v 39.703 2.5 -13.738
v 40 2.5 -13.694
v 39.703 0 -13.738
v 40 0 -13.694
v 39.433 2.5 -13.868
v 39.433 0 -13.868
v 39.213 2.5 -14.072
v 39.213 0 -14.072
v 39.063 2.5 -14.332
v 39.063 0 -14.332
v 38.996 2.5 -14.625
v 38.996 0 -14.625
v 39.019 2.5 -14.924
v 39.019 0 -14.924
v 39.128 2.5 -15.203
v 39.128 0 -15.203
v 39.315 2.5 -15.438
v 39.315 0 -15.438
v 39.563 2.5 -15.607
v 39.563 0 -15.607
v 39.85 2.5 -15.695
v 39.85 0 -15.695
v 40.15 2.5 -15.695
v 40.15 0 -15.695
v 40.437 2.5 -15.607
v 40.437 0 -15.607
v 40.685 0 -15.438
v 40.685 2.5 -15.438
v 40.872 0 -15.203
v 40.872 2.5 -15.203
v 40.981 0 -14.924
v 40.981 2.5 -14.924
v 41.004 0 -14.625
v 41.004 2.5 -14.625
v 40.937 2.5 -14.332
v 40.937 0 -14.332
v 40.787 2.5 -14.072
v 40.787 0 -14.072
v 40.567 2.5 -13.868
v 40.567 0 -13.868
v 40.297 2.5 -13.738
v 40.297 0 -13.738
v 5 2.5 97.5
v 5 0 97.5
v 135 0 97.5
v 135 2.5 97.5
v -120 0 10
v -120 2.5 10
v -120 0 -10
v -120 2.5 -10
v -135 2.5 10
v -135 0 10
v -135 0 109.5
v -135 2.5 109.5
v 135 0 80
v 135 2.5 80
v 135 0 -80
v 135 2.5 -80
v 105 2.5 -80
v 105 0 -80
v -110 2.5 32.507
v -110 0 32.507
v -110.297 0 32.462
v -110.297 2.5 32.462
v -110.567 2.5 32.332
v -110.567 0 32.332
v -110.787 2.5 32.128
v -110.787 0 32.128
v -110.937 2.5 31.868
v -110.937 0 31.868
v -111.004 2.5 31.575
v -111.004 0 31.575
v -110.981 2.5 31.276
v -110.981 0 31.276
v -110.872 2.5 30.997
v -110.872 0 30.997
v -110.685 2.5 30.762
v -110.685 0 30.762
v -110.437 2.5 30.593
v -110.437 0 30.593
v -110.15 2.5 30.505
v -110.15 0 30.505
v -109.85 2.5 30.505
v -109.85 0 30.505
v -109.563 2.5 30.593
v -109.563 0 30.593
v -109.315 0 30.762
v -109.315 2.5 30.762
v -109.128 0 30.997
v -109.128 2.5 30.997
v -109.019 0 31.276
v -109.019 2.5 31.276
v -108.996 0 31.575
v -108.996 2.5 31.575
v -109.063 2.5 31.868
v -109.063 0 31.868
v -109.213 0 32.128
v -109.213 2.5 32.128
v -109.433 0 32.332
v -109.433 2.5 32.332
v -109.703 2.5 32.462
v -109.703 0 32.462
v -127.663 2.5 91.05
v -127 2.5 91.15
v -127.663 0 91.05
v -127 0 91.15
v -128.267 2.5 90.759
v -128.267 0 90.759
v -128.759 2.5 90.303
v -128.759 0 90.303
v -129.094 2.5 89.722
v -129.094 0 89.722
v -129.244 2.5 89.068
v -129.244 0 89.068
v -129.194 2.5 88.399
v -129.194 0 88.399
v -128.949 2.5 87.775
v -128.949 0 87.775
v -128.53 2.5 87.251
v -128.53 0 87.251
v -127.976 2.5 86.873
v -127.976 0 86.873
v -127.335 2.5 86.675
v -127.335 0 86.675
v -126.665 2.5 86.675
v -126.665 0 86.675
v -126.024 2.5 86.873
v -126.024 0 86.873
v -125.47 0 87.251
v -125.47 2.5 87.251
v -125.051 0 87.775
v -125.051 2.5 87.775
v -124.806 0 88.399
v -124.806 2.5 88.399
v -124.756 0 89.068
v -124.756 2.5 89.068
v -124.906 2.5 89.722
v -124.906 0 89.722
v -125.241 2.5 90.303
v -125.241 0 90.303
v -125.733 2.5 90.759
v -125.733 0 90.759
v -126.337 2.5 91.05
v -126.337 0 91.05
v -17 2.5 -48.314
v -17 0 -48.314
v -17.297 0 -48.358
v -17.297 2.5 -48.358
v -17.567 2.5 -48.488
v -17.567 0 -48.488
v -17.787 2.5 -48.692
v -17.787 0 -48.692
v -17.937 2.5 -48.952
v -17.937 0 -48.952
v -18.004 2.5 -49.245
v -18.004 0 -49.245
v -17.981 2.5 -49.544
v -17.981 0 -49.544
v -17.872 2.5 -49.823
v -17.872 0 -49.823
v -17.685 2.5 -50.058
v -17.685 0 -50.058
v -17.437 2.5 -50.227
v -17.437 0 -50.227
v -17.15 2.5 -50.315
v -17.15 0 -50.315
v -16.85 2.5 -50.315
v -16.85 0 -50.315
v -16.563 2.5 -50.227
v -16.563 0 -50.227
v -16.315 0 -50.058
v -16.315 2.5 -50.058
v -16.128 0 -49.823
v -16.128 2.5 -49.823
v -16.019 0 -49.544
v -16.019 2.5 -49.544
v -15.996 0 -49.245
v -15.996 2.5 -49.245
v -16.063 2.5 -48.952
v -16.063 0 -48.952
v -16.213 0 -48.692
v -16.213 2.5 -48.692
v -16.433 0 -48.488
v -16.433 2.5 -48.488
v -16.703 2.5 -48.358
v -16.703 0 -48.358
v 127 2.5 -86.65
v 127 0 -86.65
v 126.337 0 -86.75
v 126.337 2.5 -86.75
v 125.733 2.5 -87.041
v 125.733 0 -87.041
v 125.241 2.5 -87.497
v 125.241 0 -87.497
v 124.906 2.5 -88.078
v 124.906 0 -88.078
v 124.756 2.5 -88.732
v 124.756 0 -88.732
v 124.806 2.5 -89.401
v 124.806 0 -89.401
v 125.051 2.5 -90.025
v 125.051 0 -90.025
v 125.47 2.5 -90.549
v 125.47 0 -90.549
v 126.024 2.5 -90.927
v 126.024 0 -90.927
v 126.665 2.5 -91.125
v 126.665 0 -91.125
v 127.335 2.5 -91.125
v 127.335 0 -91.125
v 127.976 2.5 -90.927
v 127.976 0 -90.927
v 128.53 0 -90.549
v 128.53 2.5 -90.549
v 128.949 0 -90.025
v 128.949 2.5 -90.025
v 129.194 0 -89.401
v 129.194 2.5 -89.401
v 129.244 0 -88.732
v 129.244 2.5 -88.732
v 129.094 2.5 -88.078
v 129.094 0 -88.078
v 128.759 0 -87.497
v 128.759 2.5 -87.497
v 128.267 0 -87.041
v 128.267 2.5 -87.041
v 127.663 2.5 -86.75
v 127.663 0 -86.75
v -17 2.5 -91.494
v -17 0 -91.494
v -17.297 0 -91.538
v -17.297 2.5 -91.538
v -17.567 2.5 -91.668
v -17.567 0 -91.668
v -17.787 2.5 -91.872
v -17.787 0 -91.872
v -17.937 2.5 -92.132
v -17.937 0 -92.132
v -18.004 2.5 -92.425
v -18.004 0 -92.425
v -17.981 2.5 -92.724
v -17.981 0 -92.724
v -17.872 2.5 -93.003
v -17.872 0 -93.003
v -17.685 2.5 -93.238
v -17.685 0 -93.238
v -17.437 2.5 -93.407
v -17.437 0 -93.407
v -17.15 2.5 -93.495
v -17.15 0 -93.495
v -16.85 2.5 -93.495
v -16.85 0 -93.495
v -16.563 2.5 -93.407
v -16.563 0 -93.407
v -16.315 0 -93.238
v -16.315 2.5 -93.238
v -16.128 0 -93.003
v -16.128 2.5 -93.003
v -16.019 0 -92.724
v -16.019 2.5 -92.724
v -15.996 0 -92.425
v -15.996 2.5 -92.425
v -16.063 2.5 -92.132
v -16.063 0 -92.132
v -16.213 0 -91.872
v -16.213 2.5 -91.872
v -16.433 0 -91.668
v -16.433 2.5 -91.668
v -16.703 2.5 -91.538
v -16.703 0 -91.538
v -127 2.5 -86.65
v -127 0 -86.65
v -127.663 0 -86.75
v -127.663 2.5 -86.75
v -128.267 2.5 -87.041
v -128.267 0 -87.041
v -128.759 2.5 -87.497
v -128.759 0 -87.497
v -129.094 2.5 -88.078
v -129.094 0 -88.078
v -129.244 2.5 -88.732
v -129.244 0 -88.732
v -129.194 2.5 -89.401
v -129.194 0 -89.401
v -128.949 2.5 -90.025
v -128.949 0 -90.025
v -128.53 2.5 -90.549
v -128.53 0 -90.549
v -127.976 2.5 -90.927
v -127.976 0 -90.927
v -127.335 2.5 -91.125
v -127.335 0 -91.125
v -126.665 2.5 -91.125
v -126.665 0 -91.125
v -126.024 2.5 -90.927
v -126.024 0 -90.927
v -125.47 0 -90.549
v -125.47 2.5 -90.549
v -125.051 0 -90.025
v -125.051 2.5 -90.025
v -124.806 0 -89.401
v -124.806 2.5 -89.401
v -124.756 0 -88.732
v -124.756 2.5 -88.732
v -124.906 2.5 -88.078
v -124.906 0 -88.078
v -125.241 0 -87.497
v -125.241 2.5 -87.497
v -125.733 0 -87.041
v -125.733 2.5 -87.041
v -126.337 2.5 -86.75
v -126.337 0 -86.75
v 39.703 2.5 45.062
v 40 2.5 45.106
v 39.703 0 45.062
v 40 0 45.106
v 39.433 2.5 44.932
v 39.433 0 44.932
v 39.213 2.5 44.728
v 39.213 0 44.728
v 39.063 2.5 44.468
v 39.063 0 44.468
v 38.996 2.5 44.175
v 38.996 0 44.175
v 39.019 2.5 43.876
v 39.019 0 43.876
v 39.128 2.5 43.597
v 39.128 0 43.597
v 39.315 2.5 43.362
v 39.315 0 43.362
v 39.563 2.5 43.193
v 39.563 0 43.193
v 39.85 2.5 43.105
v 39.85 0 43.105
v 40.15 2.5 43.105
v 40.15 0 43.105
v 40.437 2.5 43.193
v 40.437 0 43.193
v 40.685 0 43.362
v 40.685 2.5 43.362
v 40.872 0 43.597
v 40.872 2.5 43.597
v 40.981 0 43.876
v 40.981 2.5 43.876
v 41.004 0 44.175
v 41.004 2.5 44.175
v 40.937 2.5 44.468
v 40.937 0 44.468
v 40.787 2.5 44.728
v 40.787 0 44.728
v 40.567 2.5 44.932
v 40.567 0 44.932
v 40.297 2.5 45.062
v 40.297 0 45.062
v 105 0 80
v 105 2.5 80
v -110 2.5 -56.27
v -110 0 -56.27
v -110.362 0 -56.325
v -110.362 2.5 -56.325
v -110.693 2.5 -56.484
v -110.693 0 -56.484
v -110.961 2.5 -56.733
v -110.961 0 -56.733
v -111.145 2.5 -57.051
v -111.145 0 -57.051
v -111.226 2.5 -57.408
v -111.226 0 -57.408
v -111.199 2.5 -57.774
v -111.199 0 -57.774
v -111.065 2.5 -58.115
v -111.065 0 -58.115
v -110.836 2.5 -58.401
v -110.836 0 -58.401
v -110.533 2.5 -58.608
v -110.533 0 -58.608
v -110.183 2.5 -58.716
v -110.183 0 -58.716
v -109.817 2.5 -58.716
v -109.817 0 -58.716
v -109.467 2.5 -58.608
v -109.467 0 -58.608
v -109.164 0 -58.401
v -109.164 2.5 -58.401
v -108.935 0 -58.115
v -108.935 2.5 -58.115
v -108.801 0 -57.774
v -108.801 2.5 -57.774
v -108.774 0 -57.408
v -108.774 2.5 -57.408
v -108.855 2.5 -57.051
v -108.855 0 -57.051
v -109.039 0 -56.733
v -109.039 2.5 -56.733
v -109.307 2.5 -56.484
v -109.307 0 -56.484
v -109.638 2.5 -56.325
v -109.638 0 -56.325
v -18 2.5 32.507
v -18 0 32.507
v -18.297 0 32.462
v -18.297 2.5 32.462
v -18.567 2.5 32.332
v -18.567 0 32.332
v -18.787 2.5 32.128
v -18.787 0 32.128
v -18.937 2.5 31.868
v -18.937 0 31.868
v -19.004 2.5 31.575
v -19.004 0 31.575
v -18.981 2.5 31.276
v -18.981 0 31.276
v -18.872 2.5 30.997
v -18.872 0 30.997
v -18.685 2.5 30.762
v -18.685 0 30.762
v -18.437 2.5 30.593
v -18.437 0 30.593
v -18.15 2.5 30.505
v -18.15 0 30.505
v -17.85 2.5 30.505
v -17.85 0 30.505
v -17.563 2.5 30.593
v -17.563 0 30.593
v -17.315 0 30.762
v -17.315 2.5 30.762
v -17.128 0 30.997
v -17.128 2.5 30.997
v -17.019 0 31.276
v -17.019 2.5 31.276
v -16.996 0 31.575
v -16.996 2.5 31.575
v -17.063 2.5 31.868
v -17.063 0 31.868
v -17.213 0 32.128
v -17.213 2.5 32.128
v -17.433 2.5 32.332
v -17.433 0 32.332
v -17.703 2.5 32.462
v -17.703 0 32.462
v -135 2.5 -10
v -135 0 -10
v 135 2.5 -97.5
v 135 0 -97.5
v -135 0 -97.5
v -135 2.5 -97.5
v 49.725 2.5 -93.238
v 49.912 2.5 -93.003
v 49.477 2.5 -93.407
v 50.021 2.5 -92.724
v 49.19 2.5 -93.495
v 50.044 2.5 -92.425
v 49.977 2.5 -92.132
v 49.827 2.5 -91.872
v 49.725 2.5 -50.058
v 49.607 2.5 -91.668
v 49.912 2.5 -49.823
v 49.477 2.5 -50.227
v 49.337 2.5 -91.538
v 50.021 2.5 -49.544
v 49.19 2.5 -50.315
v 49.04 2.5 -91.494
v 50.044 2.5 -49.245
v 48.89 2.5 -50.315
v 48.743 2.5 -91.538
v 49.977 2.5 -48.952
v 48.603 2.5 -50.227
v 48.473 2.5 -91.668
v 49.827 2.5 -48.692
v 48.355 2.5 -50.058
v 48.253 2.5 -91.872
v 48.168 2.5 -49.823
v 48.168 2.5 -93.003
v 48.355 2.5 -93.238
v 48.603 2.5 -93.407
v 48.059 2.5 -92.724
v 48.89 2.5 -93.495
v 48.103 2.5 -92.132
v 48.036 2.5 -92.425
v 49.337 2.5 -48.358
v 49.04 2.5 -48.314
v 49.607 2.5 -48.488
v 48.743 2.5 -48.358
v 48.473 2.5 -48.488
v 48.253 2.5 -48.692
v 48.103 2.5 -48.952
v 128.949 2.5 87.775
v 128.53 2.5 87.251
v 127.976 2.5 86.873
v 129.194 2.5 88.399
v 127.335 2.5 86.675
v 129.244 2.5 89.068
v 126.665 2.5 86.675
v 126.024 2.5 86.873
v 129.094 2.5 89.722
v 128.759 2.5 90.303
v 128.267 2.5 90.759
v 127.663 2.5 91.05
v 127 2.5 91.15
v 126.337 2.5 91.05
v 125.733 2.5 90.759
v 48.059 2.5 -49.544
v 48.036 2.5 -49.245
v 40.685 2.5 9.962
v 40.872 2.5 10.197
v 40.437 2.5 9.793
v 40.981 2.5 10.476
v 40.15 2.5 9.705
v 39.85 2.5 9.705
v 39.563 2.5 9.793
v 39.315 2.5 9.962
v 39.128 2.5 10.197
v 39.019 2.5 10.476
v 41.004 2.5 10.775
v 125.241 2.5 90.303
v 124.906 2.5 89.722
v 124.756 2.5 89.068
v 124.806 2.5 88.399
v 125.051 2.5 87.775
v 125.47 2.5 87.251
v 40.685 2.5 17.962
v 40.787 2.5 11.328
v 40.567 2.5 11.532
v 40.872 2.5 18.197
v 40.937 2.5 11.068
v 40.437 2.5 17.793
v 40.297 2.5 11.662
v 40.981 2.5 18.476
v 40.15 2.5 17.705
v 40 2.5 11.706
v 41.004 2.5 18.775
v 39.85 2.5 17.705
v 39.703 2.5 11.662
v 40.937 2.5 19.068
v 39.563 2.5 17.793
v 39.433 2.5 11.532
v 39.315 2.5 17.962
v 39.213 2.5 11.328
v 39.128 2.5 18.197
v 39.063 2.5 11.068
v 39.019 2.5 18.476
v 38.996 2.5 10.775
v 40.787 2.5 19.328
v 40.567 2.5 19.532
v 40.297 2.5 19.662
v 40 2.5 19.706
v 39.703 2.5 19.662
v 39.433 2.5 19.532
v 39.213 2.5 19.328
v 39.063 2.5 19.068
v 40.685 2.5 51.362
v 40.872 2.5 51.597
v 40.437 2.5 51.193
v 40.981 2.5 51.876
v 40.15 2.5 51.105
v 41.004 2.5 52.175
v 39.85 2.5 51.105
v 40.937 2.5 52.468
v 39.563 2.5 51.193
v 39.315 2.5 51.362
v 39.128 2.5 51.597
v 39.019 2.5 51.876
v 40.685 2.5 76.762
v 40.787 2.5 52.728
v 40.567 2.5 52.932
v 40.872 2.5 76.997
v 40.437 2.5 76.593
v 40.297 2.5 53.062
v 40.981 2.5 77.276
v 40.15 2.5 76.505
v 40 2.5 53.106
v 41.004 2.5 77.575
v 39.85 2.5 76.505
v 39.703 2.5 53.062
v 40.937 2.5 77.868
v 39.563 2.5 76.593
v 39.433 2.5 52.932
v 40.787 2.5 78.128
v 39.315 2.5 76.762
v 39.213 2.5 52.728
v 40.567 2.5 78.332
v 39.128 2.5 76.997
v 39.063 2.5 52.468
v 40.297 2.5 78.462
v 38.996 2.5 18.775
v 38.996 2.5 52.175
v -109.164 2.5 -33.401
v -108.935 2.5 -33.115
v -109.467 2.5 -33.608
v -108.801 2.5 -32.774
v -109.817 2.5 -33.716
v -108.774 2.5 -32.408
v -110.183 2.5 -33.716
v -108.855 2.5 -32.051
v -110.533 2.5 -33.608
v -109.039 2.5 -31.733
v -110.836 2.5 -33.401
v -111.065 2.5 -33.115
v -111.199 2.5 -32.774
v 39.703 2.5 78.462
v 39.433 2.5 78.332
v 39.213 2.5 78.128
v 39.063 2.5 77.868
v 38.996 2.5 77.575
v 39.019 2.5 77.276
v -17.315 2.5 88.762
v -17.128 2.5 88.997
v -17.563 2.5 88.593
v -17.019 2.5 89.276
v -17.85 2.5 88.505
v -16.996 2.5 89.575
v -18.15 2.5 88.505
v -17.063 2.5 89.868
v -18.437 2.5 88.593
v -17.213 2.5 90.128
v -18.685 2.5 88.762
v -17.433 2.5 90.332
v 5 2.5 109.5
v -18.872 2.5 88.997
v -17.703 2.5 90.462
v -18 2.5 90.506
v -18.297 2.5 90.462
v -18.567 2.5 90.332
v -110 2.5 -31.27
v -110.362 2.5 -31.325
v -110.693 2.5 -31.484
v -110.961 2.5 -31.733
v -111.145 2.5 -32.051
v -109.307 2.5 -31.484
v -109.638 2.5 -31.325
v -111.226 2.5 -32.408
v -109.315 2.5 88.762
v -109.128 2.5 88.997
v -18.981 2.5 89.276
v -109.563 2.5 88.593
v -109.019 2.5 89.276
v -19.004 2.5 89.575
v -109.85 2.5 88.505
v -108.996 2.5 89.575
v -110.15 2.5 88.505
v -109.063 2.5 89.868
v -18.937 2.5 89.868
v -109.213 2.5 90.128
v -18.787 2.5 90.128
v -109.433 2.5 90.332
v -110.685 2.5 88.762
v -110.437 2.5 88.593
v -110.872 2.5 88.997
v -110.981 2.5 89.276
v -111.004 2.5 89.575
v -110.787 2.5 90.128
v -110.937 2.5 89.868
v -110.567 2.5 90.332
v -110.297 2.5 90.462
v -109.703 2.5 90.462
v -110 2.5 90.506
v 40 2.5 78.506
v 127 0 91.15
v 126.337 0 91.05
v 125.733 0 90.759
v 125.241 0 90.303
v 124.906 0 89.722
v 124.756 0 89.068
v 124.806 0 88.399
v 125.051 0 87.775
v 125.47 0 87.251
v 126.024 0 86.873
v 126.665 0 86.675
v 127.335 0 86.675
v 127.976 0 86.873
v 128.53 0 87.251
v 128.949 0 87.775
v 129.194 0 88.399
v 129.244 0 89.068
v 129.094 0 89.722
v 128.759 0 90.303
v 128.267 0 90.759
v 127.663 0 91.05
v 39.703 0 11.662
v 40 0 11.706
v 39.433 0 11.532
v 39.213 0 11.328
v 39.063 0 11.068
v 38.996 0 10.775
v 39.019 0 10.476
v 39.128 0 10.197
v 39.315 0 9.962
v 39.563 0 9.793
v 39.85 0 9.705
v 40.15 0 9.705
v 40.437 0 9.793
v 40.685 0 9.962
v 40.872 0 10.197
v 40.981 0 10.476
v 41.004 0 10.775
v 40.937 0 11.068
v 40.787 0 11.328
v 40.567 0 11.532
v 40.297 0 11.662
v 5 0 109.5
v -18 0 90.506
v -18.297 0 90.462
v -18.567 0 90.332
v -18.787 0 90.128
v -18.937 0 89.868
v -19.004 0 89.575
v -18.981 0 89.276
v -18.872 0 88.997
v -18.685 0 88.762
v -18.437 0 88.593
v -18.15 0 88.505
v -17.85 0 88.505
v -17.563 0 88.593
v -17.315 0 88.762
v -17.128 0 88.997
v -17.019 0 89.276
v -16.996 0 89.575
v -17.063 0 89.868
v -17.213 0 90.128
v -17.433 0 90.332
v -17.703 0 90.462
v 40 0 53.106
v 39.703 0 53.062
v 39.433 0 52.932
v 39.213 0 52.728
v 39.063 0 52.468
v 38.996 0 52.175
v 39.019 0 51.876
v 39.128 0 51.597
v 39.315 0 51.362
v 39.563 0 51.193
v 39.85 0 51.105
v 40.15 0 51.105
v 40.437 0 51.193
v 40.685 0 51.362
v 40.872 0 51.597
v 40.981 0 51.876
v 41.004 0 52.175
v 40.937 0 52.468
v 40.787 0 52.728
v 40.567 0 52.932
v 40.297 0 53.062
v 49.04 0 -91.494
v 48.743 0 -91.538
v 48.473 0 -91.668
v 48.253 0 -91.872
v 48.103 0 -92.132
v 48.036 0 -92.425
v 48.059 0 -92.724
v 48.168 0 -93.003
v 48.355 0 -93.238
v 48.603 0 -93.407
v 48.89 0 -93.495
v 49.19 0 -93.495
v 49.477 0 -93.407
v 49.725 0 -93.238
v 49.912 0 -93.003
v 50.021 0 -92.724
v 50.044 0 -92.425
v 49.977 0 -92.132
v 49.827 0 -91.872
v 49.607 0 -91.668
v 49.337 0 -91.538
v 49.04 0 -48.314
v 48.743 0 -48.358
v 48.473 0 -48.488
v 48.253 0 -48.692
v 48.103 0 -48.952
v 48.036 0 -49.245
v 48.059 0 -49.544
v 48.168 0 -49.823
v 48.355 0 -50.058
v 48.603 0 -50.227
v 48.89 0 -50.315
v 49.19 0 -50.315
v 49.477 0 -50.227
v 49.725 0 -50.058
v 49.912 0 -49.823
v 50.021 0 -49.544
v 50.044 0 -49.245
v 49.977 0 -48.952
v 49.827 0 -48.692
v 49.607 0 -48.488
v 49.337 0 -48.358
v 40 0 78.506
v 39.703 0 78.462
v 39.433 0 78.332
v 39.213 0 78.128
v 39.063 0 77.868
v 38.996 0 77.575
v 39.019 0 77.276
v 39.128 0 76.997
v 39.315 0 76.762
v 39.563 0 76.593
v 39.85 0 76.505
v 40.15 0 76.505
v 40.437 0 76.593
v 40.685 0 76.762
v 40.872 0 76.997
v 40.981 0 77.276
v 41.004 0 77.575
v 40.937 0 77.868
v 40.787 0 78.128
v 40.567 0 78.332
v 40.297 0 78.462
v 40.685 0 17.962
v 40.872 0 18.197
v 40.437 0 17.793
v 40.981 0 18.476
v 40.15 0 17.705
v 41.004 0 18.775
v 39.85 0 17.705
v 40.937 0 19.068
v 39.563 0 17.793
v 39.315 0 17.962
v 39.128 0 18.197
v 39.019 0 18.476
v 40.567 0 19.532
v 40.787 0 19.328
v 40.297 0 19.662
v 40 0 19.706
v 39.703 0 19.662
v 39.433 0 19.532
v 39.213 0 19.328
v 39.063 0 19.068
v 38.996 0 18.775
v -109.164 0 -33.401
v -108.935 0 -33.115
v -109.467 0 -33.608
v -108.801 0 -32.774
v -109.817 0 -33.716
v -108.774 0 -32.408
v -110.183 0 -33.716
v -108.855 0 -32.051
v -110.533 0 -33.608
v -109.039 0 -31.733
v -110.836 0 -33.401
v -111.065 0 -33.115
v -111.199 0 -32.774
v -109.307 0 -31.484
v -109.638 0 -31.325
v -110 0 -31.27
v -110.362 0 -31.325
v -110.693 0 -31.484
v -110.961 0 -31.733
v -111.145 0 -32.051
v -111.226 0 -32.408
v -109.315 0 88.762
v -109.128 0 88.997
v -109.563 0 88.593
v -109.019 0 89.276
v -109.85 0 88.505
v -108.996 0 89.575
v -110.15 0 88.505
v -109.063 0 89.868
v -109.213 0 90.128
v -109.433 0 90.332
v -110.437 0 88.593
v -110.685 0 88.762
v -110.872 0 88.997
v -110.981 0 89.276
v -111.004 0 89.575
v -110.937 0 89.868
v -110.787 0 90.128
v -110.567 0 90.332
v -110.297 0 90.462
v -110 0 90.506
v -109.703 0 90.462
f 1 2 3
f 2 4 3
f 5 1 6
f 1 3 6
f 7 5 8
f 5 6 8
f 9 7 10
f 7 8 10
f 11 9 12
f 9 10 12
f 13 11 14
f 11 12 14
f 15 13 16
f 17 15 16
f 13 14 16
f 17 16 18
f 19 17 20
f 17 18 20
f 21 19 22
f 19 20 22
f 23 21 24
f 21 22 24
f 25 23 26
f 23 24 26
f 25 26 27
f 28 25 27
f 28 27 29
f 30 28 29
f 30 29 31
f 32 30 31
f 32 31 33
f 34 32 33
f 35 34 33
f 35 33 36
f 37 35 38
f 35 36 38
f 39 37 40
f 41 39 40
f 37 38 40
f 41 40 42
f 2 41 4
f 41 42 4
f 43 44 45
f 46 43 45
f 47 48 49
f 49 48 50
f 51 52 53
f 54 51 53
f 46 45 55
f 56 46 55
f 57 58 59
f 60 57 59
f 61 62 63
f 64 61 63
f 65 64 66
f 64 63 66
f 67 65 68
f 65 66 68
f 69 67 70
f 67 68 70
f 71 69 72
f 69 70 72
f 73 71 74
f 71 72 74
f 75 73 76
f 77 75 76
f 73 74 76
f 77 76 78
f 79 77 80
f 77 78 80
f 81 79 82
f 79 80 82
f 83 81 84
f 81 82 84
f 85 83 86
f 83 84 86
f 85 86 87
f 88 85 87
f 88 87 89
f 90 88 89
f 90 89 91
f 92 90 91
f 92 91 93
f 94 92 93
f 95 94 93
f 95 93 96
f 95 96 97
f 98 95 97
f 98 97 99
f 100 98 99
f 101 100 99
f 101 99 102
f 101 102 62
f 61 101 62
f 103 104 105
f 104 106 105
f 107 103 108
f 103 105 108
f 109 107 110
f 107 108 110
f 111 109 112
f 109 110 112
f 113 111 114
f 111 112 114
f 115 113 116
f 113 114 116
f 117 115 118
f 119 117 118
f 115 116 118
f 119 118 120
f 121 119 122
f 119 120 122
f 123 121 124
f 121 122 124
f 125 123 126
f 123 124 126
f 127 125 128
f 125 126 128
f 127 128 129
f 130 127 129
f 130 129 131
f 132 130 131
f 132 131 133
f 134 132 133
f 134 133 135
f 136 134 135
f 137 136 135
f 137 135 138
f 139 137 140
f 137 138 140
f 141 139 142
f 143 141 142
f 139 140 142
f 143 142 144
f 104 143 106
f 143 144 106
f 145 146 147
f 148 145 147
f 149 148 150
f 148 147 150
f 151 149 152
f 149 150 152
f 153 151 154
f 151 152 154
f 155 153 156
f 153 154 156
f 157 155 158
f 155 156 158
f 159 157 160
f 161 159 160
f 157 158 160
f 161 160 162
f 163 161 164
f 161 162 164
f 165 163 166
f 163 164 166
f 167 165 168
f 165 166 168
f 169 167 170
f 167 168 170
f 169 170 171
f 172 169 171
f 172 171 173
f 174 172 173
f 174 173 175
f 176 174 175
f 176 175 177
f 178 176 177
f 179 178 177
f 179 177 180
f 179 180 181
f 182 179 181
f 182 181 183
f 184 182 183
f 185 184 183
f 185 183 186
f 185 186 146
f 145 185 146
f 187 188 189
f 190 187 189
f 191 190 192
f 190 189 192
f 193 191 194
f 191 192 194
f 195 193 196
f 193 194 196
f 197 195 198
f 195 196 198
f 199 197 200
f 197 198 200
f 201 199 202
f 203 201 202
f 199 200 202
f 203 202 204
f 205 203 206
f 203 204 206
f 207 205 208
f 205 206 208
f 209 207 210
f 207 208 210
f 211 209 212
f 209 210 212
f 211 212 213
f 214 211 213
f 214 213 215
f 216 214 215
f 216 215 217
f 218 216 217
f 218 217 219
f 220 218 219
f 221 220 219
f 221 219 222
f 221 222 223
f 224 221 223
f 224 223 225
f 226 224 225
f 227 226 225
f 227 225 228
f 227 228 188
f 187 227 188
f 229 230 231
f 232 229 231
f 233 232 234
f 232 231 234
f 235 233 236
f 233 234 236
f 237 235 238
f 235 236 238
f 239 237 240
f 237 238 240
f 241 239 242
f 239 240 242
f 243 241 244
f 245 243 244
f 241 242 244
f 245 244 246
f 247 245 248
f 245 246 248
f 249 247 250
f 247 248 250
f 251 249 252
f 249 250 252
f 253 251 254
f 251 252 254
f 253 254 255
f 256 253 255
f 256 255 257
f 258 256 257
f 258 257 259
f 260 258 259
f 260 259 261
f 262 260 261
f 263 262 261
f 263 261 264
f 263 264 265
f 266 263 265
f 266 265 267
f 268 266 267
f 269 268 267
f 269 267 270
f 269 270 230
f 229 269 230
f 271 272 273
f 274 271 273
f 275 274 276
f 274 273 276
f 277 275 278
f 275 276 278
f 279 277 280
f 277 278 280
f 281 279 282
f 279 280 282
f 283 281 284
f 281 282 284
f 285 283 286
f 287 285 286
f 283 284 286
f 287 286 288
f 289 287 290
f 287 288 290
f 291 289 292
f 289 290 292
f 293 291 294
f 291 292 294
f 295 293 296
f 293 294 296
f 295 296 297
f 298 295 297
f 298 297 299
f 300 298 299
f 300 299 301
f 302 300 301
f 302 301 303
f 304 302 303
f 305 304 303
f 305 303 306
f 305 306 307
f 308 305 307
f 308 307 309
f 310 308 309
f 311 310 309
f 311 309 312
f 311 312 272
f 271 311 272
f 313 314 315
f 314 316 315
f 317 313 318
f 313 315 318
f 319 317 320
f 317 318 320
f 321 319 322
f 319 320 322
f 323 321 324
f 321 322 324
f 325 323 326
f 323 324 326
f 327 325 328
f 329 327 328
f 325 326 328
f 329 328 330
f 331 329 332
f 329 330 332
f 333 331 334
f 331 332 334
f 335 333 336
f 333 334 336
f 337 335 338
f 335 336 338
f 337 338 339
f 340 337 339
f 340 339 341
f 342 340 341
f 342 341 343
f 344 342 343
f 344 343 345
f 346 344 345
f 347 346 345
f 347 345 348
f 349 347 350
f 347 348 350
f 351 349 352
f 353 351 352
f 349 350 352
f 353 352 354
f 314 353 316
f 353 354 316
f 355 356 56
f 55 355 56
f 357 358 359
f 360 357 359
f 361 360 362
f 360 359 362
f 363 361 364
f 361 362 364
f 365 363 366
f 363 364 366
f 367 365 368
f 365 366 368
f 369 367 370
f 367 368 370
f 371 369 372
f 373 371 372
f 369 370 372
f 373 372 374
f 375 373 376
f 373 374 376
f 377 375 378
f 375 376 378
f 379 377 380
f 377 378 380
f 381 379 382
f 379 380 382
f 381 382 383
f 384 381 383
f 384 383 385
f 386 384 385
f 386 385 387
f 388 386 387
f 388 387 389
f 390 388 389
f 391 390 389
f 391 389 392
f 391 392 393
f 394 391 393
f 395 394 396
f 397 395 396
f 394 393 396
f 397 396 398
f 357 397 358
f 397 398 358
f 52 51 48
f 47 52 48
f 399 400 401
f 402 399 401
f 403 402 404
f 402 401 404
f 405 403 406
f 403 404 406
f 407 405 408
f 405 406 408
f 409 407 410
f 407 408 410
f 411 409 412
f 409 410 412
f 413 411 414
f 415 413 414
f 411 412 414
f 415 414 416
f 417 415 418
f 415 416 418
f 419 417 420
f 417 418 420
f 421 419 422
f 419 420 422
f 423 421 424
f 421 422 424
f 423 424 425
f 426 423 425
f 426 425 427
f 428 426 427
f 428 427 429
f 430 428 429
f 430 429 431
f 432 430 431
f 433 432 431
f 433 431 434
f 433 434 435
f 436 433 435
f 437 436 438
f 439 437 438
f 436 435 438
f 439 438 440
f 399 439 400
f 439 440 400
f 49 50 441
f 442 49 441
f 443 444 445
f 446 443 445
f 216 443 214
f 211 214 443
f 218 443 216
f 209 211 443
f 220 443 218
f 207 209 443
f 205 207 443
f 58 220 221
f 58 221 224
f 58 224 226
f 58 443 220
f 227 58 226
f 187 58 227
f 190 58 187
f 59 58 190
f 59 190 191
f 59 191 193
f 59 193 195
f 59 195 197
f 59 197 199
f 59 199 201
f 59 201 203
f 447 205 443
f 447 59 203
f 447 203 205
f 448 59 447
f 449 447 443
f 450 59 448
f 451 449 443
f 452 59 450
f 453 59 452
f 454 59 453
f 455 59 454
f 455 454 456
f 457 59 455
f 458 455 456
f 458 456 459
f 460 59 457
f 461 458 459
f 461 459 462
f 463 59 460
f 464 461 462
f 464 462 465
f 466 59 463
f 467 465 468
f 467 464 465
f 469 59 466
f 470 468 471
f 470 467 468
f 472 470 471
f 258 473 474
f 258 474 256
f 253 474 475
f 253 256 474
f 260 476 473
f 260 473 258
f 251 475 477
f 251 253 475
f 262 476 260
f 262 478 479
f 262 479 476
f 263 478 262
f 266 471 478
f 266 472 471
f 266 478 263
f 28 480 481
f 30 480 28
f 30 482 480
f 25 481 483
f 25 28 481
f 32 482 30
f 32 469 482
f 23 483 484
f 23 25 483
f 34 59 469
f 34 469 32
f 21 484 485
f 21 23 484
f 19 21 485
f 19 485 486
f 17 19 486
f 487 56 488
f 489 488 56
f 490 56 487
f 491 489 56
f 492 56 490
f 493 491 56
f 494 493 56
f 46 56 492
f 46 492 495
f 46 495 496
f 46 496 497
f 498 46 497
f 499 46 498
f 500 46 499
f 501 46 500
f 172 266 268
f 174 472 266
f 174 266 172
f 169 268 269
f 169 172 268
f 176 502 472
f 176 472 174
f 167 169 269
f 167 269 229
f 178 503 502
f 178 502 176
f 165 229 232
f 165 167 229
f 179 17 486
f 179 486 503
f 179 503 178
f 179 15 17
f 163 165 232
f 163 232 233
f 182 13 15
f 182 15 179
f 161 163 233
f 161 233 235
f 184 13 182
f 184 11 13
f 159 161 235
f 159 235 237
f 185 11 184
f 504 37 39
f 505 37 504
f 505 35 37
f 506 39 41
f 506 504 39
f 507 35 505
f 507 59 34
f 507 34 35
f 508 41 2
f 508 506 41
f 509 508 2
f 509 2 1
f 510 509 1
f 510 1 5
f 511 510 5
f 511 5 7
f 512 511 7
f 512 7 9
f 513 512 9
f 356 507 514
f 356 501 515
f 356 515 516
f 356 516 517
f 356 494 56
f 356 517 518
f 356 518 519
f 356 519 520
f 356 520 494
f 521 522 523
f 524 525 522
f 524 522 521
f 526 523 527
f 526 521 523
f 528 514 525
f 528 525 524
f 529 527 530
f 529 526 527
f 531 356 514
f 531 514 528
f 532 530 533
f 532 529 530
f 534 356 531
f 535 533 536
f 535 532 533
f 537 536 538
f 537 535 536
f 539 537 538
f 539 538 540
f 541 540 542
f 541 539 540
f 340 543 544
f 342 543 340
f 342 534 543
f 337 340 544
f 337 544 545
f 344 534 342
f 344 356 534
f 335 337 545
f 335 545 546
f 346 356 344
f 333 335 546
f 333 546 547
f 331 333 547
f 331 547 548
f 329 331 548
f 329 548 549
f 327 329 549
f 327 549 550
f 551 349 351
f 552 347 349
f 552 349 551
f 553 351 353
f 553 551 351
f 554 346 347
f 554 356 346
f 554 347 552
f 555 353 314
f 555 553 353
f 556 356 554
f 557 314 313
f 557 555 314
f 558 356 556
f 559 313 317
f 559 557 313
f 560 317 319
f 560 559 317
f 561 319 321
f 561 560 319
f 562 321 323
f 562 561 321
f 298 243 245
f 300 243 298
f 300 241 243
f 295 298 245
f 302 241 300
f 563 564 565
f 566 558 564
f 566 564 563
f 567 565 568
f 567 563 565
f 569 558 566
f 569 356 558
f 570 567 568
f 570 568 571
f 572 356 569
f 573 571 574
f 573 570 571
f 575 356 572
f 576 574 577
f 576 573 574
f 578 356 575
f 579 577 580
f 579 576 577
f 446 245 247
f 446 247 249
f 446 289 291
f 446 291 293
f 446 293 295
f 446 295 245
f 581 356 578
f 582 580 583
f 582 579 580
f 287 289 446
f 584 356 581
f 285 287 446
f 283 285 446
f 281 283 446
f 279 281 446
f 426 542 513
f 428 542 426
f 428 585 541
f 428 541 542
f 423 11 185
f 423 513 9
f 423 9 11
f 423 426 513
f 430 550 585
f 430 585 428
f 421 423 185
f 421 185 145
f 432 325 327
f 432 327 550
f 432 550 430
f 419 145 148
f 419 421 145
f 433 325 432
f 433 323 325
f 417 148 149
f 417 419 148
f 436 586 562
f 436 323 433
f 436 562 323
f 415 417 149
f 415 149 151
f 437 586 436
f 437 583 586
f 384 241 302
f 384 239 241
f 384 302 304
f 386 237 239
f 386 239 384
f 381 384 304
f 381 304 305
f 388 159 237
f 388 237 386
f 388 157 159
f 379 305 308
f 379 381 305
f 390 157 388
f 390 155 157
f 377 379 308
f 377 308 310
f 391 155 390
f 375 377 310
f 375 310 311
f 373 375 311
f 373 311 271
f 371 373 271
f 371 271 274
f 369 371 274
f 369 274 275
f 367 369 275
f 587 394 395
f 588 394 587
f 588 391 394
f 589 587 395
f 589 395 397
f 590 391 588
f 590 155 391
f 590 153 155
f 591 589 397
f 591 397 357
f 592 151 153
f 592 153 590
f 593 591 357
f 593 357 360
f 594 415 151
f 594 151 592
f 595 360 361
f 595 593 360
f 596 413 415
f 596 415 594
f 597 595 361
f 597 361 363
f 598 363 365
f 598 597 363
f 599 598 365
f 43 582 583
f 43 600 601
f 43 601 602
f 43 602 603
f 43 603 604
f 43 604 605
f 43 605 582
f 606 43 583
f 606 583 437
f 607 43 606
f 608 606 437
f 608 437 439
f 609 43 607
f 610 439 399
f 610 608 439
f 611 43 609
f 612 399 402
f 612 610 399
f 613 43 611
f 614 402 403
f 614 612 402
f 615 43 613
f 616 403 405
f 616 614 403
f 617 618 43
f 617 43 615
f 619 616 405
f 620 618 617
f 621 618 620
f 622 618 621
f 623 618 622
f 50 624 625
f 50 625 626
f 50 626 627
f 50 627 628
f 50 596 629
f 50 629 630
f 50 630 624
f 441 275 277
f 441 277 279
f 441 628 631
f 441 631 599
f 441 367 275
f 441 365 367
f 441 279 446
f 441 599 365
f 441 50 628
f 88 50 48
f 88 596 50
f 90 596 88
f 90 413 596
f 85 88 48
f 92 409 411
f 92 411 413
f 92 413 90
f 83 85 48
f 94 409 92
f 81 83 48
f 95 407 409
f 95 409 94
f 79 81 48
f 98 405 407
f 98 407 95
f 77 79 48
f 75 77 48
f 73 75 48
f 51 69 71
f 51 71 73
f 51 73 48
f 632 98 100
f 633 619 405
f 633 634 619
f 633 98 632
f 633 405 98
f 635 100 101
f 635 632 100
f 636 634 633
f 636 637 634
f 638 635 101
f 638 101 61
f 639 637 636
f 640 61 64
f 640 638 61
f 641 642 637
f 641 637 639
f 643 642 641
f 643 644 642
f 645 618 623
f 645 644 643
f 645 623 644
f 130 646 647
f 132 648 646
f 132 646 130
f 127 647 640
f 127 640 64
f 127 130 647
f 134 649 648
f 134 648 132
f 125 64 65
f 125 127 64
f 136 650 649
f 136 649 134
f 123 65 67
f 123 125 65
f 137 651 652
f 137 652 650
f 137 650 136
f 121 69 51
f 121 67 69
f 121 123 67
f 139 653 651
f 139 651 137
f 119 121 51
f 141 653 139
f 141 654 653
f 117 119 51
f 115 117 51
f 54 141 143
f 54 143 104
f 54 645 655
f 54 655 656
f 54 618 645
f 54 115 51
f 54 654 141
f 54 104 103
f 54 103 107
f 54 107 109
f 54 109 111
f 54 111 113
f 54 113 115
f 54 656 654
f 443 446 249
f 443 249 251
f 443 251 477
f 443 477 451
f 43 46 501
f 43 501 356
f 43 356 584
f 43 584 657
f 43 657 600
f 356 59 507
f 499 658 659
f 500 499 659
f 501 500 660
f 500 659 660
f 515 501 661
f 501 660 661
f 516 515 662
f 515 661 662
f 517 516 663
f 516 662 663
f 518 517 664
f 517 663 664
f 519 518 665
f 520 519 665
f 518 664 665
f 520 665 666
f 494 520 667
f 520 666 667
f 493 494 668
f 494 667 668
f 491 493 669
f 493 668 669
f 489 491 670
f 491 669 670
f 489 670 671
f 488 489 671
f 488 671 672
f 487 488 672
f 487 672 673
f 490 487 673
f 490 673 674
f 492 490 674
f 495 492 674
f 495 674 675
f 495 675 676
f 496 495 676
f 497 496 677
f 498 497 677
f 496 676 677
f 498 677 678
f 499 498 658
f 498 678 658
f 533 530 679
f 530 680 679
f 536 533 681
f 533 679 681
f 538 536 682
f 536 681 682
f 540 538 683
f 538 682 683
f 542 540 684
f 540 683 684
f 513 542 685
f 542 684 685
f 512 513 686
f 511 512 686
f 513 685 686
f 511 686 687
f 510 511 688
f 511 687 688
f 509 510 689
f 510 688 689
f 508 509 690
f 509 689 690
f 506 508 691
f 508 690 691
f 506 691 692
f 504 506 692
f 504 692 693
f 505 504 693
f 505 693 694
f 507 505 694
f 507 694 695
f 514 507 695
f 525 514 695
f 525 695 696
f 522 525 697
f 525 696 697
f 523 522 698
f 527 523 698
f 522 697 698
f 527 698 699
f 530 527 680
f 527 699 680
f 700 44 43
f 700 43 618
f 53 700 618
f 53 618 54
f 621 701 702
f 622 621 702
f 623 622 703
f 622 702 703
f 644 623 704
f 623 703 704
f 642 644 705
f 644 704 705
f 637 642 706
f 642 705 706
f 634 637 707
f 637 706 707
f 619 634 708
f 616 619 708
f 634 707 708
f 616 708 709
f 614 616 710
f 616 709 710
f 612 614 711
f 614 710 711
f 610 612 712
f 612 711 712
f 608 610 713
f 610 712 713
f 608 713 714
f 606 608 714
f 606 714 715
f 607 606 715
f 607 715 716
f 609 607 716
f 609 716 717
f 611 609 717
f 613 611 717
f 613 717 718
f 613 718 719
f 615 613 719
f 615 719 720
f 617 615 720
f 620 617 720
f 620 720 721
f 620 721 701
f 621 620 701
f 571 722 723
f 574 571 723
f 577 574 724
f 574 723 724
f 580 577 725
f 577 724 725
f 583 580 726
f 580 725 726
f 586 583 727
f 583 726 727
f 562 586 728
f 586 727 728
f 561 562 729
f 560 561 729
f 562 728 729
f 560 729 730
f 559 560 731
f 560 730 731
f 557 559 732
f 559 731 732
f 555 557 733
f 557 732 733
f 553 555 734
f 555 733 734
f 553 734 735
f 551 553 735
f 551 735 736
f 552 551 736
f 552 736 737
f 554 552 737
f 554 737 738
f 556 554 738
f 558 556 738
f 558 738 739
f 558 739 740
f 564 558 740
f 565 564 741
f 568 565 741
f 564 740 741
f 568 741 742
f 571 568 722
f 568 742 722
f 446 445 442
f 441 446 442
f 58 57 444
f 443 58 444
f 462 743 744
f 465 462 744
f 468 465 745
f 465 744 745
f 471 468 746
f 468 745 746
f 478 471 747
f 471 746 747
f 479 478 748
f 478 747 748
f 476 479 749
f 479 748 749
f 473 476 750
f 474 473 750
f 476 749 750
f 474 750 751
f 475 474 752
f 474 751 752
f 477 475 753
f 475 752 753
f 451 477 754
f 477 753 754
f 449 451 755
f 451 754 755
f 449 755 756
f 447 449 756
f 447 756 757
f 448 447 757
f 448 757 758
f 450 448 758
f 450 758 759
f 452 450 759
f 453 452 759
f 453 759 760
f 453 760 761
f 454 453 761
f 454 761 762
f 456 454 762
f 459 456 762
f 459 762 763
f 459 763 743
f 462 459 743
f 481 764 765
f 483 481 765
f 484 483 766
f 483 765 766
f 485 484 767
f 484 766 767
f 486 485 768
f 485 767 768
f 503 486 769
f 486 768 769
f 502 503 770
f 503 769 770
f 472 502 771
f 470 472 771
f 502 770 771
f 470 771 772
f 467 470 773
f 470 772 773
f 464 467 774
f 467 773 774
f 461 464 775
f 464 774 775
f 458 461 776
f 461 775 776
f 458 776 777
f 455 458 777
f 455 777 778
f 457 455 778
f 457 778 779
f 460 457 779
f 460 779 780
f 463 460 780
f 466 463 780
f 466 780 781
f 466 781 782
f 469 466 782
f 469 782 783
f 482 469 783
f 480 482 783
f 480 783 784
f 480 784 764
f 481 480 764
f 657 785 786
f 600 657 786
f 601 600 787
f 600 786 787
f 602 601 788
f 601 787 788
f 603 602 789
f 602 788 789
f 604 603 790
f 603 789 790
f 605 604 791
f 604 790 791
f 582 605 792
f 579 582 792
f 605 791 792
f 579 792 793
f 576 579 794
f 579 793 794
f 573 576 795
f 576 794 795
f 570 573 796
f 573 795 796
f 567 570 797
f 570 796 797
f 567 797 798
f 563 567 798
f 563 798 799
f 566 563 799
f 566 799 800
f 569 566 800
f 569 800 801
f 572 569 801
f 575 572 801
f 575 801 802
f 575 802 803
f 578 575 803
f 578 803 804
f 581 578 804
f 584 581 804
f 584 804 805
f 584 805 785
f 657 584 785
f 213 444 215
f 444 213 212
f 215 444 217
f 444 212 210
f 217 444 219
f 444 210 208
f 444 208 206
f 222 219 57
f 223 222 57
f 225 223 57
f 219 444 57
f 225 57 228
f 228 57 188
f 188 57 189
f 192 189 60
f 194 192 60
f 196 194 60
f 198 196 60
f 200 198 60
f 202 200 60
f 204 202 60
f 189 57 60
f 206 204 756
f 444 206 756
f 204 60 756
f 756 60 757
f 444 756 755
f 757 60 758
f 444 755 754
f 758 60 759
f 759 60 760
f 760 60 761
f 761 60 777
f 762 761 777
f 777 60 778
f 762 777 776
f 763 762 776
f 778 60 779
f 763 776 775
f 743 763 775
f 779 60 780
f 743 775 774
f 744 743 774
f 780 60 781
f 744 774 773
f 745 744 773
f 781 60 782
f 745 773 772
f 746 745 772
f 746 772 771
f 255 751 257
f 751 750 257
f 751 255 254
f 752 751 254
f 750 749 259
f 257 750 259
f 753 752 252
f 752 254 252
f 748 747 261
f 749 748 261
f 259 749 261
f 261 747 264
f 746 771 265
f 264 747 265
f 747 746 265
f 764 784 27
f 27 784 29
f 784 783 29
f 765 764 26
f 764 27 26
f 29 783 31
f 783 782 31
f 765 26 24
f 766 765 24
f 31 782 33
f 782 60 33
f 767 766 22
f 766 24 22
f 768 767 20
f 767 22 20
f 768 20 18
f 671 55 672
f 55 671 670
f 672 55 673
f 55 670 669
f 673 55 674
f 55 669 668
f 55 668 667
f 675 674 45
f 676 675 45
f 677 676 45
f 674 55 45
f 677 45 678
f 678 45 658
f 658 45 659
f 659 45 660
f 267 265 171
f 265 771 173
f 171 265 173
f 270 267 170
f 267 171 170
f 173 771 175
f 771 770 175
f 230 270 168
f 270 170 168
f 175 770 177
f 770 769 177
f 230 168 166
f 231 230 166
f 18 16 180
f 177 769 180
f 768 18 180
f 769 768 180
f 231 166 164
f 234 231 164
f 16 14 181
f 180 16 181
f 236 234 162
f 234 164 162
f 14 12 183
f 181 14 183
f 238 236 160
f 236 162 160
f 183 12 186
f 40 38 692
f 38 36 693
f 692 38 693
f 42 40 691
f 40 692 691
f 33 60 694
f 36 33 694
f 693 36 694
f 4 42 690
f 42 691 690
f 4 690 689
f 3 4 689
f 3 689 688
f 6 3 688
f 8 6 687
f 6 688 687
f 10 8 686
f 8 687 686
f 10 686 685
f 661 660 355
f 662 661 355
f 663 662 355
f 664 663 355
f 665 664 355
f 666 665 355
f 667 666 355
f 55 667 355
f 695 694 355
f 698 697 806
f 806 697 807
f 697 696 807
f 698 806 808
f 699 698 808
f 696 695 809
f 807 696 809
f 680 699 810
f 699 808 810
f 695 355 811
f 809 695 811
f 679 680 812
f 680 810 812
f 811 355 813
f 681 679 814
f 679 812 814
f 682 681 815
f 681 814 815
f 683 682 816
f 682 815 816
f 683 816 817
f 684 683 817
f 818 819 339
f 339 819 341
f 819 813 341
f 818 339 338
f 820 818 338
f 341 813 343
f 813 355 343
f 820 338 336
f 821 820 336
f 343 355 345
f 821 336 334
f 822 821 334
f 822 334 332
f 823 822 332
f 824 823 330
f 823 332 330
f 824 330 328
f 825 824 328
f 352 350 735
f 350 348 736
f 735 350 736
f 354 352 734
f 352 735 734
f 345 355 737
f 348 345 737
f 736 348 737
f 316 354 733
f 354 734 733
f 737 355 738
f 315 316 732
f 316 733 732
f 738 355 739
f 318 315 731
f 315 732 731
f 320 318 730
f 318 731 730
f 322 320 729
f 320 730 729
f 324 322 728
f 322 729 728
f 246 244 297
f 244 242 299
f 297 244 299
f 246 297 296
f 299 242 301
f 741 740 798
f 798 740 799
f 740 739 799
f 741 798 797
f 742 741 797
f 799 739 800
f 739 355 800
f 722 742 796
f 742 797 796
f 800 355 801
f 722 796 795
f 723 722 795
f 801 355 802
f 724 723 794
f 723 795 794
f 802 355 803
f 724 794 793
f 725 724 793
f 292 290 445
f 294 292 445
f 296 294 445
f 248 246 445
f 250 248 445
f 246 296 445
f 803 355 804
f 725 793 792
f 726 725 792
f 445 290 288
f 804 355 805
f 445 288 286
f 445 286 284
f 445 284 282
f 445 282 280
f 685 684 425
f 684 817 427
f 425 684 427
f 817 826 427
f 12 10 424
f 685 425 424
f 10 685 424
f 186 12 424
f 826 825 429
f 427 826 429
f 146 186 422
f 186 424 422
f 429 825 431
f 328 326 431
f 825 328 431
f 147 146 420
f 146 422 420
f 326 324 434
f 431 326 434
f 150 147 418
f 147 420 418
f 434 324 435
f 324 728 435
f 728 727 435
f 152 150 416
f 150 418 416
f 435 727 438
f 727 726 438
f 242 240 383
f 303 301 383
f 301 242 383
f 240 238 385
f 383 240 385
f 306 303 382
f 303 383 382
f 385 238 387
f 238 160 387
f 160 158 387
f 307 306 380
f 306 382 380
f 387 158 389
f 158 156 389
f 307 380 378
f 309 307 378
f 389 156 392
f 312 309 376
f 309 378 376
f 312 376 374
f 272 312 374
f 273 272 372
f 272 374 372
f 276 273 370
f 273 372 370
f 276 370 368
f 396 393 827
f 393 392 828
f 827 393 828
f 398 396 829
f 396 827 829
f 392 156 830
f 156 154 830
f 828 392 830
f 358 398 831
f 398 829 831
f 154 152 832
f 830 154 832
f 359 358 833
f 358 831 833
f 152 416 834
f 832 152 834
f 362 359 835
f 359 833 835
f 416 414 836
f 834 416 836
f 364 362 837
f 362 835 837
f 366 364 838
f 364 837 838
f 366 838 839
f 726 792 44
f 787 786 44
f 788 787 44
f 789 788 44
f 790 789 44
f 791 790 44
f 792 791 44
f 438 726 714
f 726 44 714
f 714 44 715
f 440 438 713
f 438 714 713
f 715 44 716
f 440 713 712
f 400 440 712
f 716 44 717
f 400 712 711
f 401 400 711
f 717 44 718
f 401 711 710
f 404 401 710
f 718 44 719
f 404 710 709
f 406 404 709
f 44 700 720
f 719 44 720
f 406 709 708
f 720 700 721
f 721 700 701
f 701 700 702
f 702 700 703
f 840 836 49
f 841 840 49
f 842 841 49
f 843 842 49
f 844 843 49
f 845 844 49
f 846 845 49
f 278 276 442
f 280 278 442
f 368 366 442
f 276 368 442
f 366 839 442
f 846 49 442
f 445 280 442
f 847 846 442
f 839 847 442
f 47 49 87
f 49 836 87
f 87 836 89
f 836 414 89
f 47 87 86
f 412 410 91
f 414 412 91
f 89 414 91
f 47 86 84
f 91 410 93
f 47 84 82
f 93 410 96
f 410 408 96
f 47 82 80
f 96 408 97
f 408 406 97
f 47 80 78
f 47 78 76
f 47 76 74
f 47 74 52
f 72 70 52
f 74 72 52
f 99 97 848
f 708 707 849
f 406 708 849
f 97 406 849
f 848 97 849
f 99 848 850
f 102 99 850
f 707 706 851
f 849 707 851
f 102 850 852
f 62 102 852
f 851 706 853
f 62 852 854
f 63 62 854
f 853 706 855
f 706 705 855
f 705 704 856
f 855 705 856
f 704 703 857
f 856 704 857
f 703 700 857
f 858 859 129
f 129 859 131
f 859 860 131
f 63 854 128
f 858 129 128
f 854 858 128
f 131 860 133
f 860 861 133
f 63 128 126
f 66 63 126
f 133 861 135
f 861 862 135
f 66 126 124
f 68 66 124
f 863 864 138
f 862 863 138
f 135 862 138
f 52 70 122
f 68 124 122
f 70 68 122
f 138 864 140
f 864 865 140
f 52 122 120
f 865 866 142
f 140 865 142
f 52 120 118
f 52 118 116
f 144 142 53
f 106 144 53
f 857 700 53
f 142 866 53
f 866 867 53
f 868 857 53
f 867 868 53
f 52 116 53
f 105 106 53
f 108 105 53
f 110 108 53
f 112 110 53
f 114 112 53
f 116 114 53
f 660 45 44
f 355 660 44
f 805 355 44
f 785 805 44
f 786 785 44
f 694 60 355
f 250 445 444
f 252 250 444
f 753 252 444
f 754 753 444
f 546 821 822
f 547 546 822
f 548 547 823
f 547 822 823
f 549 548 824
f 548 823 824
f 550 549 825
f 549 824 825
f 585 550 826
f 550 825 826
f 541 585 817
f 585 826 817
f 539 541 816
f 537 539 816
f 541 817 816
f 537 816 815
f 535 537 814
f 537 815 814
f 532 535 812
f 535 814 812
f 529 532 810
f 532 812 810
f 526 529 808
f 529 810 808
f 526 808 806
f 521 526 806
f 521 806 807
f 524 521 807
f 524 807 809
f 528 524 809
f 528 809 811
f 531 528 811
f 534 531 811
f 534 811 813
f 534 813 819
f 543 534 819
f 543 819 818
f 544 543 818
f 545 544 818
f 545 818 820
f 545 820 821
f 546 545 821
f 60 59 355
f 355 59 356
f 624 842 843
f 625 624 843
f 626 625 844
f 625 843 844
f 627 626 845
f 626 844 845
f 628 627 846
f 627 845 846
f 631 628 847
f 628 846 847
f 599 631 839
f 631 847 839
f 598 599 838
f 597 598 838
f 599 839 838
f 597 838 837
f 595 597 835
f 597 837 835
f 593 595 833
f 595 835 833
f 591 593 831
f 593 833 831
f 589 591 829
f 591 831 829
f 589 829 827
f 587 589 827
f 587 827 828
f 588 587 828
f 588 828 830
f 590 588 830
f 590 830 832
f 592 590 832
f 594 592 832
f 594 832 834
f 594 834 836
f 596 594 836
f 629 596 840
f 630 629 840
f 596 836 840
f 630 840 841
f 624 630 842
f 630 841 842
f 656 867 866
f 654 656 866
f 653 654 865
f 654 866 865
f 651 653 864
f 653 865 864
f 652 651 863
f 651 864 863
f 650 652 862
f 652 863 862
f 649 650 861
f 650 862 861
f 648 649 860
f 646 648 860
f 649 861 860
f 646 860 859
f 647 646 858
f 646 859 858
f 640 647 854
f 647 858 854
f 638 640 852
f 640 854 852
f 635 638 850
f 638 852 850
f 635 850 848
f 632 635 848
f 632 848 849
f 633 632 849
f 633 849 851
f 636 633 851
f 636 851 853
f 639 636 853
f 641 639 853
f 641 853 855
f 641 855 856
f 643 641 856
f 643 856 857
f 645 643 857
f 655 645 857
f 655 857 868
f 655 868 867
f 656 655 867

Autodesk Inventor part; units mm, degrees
ref_plane "YZ Plane" through (0, 0, 0) normal (1, 0, 0) x (0, 1, 0)
ref_plane "XZ Plane" through (0, 0, 0) normal (0, 1, 0) x (-1, 0, 0)
ref_plane "XY Plane" through (0, 0, 0) normal (0, 0, 1) x (1, 0, 0)
sketch "Sketch1" plane through (0, 0, 0) normal (0, 1, 0) x (-1, 0, 0)
  line L0 (135, 97.5) -> (-135, 97.5)
  line L1 (-135, 97.5) -> (-135, -97.5)
  line L2 (-135, -97.5) -> (135, -97.5)
  line L3 (135, -97.5) -> (135, 97.5)
  line L4 (135, 97.5) -> (-135, -97.5) construction
  line L5 (-135, 97.5) -> (135, -97.5) construction
  line L6 (135, 97.5) -> (-5, 97.5)
  line L7 (-5, 97.5) -> (-5, 109.5)
  line L8 (-5, 109.5) -> (135, 109.5)
  line L9 (135, 109.5) -> (135, 97.5)
  point P0 (0, 0)
  dimension "d0" = 270
  dimension "d1" = 195
  dimension "d2" = 140
  dimension "d3" = 12
  dimension "d4" = 0
  dimension "d5" = 0
extrude "Extrusion1" add sketch "Sketch1" along normal blind 2.5
sketch "Mounting Holes" plane through (0, 2.5, 0) normal (0, 1, 0) x (1, 0, 0)
  line L0 (-127, -88.9) -> (127, -88.9) construction
  line L1 (127, -88.9) -> (127, 88.9) construction
  line L2 (127, 88.9) -> (-127, 88.9) construction
  line L3 (-127, 88.9) -> (-127, -88.9) construction
  line L4 (-127, -88.9) -> (127, 88.9) construction
  line L5 (127, -88.9) -> (-127, 88.9) construction
  point P0 (0, 0)
  dimension "d32" = 254
  dimension "d33" = 177.8
hole "Hole3" at (-127, 2.5, -88.9) at (127, 2.5, -88.9) at (127, 2.5, 88.9) at (-127, 2.5, 88.9) direction (0, -1, 0) diameter 4.5 end through all
sketch "Cut" plane through (0, 2.5, 0) normal (0, 1, 0) x (1, 0, 0)
  line L0 (135, 80) -> (105, 80)
  line L1 (105, 80) -> (105, -80)
  line L2 (105, -80) -> (135, -80)
  line L3 (135, -80) -> (135, 80)
  line L4 (135, 80) -> (105, -80) construction
  line L5 (105, 80) -> (135, -80) construction
  line L6 (135, -97.5) -> (135, 97.5) projected
  line L7 (135, 97.5) -> (-135, 97.5) projected
  line L8 (-120, 10) -> (-135, 10)
  line L9 (-135, 10) -> (-135, -10)
  line L10 (-135, -10) -> (-120, -10)
  line L11 (-120, -10) -> (-120, 10)
  line L12 (-120, 10) -> (-135, -10) construction
  line L13 (-135, 10) -> (-120, -10) construction
  line L14 (-135, 97.5) -> (-135, -109.5) projected
  line L15 (135, 72.5) -> (135, 52.5)
  point P0 (0, 0)
  point P1 (120, 0)
  point P2 (-127.5, 0)
  dimension "d62" = 30
  dimension "d63" = 160
  dimension "d64" = 0
  dimension "d65" = 97.5
  dimension "d66" = 15
  dimension "d67" = 20
  dimension "d68" = 0
  dimension "d69" = 97.5
  dimension "d72" = 0
extrude "Plate-cutout" cut sketch "Cut" against normal through all
sketch "Sketch8" plane through (0, 2.5, 0) normal (0, 1, 0) x (1, 0, 0)
  line L0 (5, -109.5) -> (-135, -109.5) construction
  line L1 (-110, -109.5) -> (-110, 97.5) construction
  line L2 (135, 97.5) -> (-135, 97.5) construction
  line L3 (-135, 97.5) -> (-135, -109.5) construction
  line L4 (-135, 10) -> (-120, 10) projected
  line L5 (-120, -10) -> (-135, -10) projected
  point P0 (0, 0)
  point P1 (-110, 57.5)
  point P2 (-110, 32.5)
  dimension "d76" = 25
  dimension "d78" = 25
  dimension "d79" = 40
  dimension "d80" = 22.5
hole "Hole6" at (-110, 2.5, -57.5) at (-110, 2.5, -32.5) direction (0, -1, 0) diameter 2.459 end through all thread size "M3x0.5" class "6H" standard "ISO Metric profile"
sketch "Sketch9" plane through (0, 2.5, 0) normal (0, 1, 0) x (1, 0, 0)
  line L0 (-117, 12) -> (-82, 12) construction
  line L1 (-82, 12) -> (-82, 6.5) construction
  line L2 (-82, 6.5) -> (-117, 6.5) construction
  line L3 (-117, 6.5) -> (-117, 12) construction
  line L4 (-135, 97.5) -> (-135, -109.5) projected
  line L5 (-135, 97.5) -> (-135, -109.5) projected
  circle A0 centre (-110, 57.5) radius 1.2295 projected
  point P0 (0, 0)
  point P1 (-135, 10)
  point P2 (-135, -10)
  dimension "d89" = 18
  dimension "d131" = 35
  dimension "d132" = 5.5
  dimension "d133" = 6.5
sketch "Sketch10" plane through (0, 2.5, 0) normal (0, 1, 0) x (1, 0, 0)
  line L0 (-17, 92.5) -> (49.04, 92.5) construction
  line L1 (49.04, 92.5) -> (49.04, 49.32) construction
  line L2 (49.04, 49.32) -> (-17, 49.32) construction
  line L3 (-17, 49.32) -> (-17, 92.5) construction
  line L4 (-17, 92.5) -> (49.04, 49.32) construction
  line L5 (49.04, 92.5) -> (-17, 49.32) construction
  line L6 (135, 97.5) -> (-135, 97.5) projected
  line L7 (-135, 97.5) -> (-135, -109.5) projected
  point P0 (0, 0)
  point P1 (16.02, 70.91)
  point P2 (-135, 10)
  dimension "d96" = 66.04
  dimension "d97" = 43.18
  dimension "d98" = 5
  dimension "d99" = 118
hole "B200 mini" at (-17, 2.5, -92.5) at (49.04, 2.5, -92.5) at (49.04, 2.5, -49.32) at (-17, 2.5, -49.32) direction (0, -1, 0) diameter 2.013 end through all thread size "M2.5x0.45" class "6H" standard "ISO Metric profile"
sketch "Sketch11" plane through (0, 2.5, 0) normal (0, 1, 0) x (1, 0, 0)
  line L0 (5, -109.5) -> (-135, -109.5) construction
  line L1 (-18, -109.5) -> (-18, 92.386) construction
  line L2 (-135, 97.5) -> (-135, -109.5) construction
  point P0 (0, 0)
  point P1 (-135, -10)
  point P2 (-18, -89.5)
  point P3 (-18, -31.5)
  point P4 (-110, -89.5)
  point P5 (-110, -31.5)
  dimension "d108" = 58
  dimension "d109" = 20
  dimension "d134" = 92
  dimension "d135" = 25
hole "RPI" at (-18, 2.5, 89.5) at (-18, 2.5, 31.5) at (-110, 2.5, 89.5) at (-110, 2.5, 31.5) direction (0, -1, 0) diameter 2.013 end through all thread size "M2.5x0.45" class "6H" standard "ISO Metric profile"
sketch "Sketch12" plane through (0, 2.5, 0) normal (0, 1, 0) x (1, 0, 0)
  line L0 (5, -97.5) -> (135, -97.5) projected
  line L1 (40, -97.5) -> (40, 97.2016) construction
  line L2 (-135, 97.5) -> (-135, -109.5) construction
  point P0 (0, 0)
  point P1 (40, 14.7)
  point P2 (40, -10.7)
  point P3 (40, -18.7)
  point P4 (40, -44.1)
  point P5 (40, -52.1)
  point P6 (40, -77.5)
  point P7 (-135, -10)
  dimension "d117" = 25.4
  dimension "d118" = 175
  dimension "d119" = 8
  dimension "d120" = 25.4
  dimension "d121" = 8
  dimension "d122" = 25.4
  dimension "d123" = 20
hole "Mini Circuits" at (40, 2.5, -14.7) at (40, 2.5, 10.7) at (40, 2.5, 18.7) at (40, 2.5, 44.1) at (40, 2.5, 52.1) at (40, 2.5, 77.5) direction (0, -1, 0) diameter 2.013 end through all thread size "M2.5x0.45" class "6H" standard "ISO Metric profile"
properties part number "Plate-1"
